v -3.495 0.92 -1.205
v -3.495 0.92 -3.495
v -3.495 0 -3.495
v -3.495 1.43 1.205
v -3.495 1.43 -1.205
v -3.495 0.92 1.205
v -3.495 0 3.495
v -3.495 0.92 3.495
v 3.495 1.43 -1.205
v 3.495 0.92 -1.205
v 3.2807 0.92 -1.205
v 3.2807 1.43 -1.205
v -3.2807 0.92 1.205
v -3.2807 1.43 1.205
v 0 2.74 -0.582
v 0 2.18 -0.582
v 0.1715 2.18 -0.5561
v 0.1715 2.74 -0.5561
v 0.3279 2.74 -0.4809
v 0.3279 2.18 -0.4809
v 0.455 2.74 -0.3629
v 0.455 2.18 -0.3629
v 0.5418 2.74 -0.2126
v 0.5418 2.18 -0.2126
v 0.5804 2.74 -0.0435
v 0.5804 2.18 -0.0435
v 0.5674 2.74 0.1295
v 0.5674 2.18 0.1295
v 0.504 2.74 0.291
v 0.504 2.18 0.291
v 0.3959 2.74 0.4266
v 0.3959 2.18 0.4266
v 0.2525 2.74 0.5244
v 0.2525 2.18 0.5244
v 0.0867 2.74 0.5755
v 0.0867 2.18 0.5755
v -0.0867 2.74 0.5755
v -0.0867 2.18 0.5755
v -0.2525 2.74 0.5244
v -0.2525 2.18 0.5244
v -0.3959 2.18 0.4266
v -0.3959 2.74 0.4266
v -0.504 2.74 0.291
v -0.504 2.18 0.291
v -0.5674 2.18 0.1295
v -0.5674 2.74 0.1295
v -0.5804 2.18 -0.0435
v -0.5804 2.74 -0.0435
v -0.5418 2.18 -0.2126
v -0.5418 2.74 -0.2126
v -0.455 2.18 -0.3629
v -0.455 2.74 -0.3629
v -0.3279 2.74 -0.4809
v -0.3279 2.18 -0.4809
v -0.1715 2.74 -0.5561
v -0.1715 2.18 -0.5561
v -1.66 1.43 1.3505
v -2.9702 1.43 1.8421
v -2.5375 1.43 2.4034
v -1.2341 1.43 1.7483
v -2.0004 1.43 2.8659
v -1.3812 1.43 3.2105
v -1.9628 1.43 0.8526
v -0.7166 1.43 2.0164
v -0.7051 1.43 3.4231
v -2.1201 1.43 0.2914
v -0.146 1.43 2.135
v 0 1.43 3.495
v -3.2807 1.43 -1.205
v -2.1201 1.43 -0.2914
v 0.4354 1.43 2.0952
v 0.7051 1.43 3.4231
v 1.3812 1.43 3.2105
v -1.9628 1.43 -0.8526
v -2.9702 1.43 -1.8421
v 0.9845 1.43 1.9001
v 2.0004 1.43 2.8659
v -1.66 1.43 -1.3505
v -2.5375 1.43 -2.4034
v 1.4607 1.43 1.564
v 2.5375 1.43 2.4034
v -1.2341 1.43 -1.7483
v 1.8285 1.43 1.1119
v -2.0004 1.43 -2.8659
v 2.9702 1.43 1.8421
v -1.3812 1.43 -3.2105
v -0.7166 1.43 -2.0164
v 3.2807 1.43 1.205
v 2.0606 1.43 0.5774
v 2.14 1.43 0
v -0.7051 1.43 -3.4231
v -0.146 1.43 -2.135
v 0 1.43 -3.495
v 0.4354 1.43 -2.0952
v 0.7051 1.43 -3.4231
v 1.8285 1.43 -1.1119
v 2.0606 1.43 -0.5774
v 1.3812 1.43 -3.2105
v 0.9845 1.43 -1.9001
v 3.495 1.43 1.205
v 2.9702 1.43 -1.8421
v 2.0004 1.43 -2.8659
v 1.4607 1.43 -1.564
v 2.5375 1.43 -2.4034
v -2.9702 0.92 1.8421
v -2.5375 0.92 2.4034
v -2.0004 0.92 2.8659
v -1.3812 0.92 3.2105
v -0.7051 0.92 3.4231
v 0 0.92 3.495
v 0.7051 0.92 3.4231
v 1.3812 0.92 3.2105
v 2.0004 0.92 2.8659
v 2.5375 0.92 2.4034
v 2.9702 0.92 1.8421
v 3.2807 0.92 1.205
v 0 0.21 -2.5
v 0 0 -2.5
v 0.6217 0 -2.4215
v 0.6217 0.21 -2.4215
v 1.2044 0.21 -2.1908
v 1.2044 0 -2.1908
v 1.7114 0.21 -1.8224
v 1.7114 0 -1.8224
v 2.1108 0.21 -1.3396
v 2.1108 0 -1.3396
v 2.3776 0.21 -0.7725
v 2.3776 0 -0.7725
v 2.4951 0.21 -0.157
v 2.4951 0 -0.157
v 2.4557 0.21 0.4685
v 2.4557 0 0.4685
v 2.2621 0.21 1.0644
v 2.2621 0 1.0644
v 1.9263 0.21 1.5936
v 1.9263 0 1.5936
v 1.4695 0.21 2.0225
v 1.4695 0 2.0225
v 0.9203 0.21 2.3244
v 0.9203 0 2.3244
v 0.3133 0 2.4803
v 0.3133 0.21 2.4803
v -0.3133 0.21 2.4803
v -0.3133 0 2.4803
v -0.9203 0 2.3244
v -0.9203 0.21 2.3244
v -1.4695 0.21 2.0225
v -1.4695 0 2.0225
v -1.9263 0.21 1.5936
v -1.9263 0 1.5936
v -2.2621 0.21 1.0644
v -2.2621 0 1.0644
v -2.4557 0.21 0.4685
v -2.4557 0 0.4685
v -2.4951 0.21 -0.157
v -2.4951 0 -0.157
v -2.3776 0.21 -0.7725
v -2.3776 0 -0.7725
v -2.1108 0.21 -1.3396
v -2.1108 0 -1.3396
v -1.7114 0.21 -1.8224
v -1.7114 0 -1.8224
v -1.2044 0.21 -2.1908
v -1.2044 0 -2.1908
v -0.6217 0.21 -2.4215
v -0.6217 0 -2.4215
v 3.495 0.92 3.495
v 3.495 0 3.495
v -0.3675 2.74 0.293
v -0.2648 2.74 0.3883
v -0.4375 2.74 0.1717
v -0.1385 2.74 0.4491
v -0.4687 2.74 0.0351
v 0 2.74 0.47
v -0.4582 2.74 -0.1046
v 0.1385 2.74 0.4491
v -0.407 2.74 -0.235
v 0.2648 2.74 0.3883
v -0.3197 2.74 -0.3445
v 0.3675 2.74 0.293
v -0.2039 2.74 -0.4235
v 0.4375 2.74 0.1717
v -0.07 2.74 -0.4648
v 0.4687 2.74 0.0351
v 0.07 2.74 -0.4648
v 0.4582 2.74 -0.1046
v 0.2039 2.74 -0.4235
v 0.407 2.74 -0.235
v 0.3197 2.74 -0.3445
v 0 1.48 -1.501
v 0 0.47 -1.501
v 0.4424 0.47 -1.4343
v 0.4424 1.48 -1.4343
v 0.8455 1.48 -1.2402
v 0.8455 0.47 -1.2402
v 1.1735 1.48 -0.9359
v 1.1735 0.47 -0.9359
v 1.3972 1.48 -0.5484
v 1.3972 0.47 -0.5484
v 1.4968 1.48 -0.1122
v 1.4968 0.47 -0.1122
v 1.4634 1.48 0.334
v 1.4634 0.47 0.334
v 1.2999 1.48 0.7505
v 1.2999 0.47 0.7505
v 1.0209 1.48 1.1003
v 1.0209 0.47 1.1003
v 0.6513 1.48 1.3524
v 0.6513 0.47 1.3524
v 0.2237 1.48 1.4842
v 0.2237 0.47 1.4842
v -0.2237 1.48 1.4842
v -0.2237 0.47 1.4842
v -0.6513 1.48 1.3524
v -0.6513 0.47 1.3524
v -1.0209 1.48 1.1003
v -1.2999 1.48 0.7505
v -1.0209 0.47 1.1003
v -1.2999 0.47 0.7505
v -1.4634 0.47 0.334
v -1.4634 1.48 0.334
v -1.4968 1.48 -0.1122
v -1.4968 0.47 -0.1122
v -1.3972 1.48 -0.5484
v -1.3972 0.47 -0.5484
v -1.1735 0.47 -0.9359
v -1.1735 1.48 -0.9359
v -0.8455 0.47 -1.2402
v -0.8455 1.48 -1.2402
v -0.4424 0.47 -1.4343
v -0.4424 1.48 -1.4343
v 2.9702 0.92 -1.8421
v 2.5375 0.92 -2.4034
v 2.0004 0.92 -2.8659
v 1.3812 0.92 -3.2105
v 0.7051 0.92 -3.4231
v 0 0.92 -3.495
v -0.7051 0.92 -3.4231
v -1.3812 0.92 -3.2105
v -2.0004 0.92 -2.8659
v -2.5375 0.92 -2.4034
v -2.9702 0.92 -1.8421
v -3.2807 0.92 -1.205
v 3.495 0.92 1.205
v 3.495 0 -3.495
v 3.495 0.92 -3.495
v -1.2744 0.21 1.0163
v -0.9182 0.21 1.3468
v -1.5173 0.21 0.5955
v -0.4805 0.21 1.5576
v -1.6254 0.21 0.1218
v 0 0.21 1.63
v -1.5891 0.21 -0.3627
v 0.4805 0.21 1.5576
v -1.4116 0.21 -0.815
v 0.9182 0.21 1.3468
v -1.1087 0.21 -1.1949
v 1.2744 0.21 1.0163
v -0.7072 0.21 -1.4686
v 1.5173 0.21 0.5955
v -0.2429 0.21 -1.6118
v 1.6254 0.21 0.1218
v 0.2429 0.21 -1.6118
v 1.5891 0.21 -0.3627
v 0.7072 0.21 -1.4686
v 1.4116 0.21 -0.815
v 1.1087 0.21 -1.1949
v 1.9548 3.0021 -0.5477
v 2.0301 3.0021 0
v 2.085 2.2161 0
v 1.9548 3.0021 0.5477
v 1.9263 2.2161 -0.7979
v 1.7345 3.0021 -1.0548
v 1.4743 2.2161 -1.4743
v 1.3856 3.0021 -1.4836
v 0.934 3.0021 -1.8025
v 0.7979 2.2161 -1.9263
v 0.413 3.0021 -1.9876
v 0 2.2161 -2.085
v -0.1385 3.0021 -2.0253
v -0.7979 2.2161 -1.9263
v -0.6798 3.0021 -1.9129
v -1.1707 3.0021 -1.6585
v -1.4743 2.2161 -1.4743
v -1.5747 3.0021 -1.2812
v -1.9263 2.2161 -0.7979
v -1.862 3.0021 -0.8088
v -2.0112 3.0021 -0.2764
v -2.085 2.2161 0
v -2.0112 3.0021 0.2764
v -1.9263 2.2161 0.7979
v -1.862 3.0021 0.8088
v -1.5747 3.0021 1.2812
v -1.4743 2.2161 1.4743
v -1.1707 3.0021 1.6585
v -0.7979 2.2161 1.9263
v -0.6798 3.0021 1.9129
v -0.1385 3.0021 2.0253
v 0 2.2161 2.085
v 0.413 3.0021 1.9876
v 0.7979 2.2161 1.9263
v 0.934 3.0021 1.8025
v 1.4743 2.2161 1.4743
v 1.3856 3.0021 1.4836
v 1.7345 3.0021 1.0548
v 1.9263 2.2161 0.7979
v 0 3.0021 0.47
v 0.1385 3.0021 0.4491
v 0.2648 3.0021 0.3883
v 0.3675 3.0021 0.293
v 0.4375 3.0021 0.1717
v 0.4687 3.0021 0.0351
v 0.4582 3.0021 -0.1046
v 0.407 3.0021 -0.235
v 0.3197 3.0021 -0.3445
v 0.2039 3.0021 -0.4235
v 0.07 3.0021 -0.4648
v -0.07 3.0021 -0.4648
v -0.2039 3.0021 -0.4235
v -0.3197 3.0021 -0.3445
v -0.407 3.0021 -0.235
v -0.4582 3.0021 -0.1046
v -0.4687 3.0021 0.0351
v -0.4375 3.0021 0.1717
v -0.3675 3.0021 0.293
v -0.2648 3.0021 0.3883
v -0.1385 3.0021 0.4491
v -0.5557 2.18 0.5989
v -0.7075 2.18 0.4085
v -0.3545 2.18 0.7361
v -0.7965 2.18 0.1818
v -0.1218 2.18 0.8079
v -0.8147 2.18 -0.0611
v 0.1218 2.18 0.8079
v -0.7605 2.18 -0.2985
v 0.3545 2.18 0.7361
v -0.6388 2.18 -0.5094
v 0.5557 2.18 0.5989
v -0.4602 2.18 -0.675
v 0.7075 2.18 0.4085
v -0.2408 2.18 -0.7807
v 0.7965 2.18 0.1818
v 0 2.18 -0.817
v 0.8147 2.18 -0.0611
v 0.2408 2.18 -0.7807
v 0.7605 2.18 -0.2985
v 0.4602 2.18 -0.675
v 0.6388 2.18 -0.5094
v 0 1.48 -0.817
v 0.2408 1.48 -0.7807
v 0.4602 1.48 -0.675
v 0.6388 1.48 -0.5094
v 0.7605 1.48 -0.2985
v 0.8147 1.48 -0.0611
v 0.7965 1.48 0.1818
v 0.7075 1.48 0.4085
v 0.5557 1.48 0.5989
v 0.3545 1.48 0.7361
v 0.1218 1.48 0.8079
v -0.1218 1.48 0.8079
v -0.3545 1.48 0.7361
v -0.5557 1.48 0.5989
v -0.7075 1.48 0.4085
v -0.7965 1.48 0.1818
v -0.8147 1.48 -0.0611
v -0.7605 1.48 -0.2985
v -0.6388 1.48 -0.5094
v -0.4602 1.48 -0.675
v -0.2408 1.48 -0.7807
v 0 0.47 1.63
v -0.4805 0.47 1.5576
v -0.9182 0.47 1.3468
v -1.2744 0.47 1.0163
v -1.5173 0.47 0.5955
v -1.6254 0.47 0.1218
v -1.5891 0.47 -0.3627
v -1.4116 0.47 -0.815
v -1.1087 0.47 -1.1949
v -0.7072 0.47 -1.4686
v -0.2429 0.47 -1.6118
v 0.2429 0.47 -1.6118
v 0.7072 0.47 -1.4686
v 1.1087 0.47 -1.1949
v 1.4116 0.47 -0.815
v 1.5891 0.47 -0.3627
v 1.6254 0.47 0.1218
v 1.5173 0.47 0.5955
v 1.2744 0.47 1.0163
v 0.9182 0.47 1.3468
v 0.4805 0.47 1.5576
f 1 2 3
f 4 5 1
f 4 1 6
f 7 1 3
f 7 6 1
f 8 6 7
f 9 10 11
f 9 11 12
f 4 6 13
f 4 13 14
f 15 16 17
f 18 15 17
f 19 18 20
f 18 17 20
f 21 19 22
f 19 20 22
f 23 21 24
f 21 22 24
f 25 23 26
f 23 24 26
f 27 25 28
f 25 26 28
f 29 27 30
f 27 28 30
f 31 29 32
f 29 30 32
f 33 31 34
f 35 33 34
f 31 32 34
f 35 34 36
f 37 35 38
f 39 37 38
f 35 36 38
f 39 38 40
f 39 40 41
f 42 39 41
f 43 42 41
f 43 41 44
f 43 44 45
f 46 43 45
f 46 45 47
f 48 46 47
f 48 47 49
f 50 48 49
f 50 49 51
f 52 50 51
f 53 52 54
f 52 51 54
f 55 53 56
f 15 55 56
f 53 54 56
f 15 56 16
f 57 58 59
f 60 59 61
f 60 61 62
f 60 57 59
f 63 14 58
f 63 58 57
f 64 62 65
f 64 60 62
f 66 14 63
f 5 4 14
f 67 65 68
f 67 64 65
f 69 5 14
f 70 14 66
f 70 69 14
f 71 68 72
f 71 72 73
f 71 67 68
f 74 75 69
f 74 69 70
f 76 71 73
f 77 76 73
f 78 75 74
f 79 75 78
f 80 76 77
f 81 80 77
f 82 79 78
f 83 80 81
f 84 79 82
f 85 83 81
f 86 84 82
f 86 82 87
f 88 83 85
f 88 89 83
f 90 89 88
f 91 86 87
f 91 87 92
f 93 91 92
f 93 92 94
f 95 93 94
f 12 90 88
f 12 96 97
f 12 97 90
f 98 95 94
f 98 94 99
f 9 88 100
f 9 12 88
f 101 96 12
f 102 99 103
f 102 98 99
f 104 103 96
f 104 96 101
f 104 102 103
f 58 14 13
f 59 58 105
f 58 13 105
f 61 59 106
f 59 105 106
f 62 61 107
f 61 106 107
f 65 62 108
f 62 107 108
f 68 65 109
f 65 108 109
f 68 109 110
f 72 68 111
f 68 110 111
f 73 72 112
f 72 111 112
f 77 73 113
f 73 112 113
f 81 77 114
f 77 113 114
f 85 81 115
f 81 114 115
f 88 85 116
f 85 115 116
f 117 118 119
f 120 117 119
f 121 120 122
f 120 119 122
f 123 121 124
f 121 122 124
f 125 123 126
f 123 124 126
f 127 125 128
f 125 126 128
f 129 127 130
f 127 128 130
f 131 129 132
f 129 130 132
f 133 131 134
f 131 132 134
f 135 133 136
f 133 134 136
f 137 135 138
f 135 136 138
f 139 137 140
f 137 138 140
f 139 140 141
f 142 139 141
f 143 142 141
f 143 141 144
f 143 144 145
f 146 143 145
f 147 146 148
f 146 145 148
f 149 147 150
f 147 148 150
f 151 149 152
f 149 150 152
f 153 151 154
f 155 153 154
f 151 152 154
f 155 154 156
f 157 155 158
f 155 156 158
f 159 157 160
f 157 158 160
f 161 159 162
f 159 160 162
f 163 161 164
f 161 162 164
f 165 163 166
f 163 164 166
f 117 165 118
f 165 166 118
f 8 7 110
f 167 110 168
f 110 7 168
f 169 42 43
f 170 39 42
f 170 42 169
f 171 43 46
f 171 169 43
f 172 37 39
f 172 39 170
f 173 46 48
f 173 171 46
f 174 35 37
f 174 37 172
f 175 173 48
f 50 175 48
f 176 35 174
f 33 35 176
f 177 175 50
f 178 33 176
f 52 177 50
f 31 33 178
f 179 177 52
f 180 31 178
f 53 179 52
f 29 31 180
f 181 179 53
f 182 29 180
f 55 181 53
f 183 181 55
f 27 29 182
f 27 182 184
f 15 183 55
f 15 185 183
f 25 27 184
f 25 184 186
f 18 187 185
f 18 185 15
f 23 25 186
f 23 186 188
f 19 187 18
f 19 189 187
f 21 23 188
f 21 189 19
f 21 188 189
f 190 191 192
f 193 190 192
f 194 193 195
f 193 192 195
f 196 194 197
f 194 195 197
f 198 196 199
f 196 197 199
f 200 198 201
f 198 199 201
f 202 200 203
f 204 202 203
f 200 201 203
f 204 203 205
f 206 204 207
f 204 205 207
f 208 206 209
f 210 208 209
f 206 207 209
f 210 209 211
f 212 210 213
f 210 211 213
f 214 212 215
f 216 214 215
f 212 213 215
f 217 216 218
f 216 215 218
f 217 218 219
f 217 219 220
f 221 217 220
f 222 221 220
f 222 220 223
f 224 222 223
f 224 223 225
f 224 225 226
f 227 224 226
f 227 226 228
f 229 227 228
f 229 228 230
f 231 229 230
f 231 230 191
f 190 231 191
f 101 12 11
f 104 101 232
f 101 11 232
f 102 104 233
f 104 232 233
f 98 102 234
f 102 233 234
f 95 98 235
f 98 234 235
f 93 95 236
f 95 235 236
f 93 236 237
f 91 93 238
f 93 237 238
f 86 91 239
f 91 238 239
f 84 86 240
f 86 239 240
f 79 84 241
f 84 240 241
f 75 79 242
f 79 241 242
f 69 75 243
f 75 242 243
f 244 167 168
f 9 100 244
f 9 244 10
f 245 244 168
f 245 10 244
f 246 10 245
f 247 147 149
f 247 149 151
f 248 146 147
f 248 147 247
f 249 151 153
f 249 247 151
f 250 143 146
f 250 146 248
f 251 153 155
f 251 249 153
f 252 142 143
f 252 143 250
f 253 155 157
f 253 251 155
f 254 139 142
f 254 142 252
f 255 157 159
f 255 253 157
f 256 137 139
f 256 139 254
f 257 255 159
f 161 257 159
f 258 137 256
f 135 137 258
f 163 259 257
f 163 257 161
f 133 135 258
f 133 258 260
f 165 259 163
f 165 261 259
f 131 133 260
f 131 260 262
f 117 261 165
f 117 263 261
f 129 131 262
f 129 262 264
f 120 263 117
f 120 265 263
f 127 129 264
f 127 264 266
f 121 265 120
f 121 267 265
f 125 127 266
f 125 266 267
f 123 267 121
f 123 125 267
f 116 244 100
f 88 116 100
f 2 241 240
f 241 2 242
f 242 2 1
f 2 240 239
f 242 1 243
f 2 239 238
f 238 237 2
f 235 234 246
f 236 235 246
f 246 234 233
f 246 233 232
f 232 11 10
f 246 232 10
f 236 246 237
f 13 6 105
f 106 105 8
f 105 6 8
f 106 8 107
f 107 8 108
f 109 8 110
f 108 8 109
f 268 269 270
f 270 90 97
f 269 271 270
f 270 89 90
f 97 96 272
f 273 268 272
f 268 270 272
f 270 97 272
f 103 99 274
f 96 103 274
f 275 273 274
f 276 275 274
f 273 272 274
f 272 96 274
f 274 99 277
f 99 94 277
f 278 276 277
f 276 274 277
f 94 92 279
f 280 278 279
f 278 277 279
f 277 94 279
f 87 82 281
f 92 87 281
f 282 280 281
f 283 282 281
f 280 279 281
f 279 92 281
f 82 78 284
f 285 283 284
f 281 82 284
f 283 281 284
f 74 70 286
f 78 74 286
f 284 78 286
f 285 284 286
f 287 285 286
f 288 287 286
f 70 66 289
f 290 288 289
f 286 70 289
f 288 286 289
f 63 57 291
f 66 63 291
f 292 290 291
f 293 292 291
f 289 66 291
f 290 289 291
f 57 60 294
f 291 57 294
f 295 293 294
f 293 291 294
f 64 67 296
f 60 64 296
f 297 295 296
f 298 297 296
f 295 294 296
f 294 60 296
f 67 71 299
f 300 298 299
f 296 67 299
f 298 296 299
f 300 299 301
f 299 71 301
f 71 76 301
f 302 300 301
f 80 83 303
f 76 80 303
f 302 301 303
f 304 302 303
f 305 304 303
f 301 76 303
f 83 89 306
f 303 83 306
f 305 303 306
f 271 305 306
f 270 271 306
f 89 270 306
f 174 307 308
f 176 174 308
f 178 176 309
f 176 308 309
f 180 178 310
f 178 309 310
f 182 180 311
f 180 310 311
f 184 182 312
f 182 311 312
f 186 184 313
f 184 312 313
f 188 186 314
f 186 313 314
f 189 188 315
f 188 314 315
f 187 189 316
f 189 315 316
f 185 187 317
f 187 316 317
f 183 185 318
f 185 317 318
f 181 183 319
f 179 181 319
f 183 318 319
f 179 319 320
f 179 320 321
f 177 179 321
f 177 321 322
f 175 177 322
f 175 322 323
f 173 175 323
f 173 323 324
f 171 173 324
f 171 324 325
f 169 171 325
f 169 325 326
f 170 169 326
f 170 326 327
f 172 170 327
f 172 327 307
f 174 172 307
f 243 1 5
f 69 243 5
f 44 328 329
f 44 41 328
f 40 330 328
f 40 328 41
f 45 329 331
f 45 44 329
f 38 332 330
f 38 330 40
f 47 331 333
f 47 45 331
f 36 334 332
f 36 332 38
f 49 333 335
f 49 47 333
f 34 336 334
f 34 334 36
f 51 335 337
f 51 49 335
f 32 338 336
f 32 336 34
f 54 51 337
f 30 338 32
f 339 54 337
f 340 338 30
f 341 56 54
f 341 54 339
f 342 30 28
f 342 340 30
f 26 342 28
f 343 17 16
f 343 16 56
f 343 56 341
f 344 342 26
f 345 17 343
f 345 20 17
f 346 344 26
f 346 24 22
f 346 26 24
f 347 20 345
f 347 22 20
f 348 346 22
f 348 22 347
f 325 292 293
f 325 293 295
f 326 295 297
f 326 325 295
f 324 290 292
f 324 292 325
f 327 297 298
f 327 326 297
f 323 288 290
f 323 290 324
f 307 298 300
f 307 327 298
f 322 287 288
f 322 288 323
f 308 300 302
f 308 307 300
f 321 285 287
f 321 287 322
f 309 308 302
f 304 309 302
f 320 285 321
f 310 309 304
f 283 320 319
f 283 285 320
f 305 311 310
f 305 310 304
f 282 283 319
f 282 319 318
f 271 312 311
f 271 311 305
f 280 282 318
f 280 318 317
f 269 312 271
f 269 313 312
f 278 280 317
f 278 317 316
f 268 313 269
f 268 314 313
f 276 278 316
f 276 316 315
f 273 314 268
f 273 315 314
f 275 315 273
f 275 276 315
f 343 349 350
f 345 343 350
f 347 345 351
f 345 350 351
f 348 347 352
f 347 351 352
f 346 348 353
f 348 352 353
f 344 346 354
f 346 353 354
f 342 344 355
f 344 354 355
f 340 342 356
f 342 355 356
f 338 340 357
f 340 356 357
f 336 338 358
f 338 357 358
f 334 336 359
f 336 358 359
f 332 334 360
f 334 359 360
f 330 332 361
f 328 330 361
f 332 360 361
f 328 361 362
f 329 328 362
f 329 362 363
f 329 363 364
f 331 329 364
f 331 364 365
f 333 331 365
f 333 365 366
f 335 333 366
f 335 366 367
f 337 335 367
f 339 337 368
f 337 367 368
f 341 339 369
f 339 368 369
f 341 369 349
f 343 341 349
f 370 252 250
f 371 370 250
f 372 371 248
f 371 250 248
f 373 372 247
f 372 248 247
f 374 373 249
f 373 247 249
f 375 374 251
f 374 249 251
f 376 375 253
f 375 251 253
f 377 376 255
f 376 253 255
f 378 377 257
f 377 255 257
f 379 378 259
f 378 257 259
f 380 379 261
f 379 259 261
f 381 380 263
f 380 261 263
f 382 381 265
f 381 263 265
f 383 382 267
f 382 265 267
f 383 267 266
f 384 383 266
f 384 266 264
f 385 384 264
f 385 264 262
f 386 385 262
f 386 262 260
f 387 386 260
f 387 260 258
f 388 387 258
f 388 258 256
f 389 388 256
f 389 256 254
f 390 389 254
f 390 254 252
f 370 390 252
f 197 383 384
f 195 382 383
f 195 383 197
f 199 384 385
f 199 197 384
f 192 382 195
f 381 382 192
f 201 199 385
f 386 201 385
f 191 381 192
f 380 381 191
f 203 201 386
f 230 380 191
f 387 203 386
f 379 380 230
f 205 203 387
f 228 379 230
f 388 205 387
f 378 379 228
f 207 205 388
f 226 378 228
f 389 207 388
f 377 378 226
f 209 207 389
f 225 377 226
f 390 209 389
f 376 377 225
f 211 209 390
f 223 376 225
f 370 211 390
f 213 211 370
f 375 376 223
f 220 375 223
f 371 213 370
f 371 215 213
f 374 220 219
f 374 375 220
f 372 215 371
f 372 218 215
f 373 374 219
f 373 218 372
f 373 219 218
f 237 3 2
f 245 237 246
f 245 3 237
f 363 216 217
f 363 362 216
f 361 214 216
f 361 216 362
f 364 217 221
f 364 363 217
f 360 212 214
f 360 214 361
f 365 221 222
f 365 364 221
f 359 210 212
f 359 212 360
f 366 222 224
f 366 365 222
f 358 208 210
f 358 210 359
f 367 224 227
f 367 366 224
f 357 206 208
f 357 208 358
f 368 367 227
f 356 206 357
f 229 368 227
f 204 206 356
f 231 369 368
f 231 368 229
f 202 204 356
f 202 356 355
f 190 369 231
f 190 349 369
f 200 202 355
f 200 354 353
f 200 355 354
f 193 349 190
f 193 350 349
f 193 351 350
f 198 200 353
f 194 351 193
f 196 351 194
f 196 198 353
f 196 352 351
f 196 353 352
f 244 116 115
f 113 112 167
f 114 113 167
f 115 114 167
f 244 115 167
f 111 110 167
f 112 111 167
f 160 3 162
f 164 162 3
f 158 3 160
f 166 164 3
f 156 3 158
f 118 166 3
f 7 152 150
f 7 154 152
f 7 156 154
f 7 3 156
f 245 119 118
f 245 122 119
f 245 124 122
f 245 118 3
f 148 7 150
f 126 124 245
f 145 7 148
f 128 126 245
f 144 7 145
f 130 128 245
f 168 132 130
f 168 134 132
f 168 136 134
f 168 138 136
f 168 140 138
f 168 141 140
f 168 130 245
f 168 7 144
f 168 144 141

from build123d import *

# Parameters (mm, degrees)
SKETCH1_W               = 7.01
SKETCH1_H               = 7.01
BOSS_EXTRUDE1_DEPTH     = 0.92
SKETCH2_R               = 3.505
BOSS_EXTRUDE2_DEPTH     = 0.83
SKETCH3_R               = 2.135
BOSS_EXTRUDE3_DEPTH     = 1.752116255
SKETCH4_R               = 2.085
CUT_EXTRUDE1_DEPTH      = 1
CUT_EXTRUDE2_DEPTH      = 7.069173606
CUT_EXTRUDE2_DEPTH_BACK = 7.069173606
SKETCH5_W               = 2.65
SKETCH5_H               = 2.65
SKETCH6_W               = 8.843273239
SKETCH6_H               = 10.721573241
SKETCH6_W_2             = 7.01
SKETCH6_H_2             = 7.01
SKETCH6_W_3             = 6
SKETCH6_H_3             = 6
CUT_EXTRUDE3_DEPTH      = 10
SKETCH7_W               = 8.855260717
SKETCH7_H               = 9.729262333
SKETCH7_R               = 3
CUT_EXTRUDE4_DEPTH      = 0.83
SKETCH8_W               = 2.771053774
SKETCH8_H               = 2.773686404
BOSS_EXTRUDE4_DEPTH     = 2.502116255
SKETCH9_R               = 0.554
CUT_EXTRUDE5_DEPTH      = 0.3
SKETCH10_R              = 0.47
CUT_EXTRUDE6_DEPTH      = 100
SKETCH11_R              = 1.501
CUT_EXTRUDE7_DEPTH      = 0.48
SKETCH12_R              = 0.817
CUT_EXTRUDE8_DEPTH      = 0.7
SKETCH14_R              = 0.582
CUT_EXTRUDE9_DEPTH      = 0.56
BOSS_EXTRUDE5_START     = 0.05
SKETCH15_R              = 0.554
SKETCH15_R_2            = 0.47
BOSS_EXTRUDE5_DEPTH     = 0.05
BOSS_EXTRUDE6_START     = 0.79
SKETCH16_R              = 2.085
SKETCH16_R_2            = 1.63
BOSS_EXTRUDE6_DEPTH     = 0.79
BOSS_EXTRUDE7_START     = 0.53
SKETCH17_R              = 1.63
SKETCH17_R_2            = 1.501
BOSS_EXTRUDE7_DEPTH     = 0.53
SKETCH18_R              = 2.572537364
SKETCH18_R_2            = 1.5
CUT_EXTRUDE10_DEPTH     = 1.752116255
BOSS_EXTRUDE8_START     = 0.21
SKETCH19_R              = 2.085
SKETCH19_R_2            = 1.705
BOSS_EXTRUDE8_DEPTH     = 0.21
SKETCH20_W              = 6.707027697
SKETCH20_H              = 11.442069063
SKETCH20_R              = 1.8
CUT_EXTRUDE11_DEPTH     = 0.83
SKETCH21_W              = 6.520255289
SKETCH21_H              = 15.458610975
SKETCH21_W_2            = 3.8
SKETCH21_H_2            = 3.8
CUT_EXTRUDE12_DEPTH     = 10
SKETCH23_W              = 6.99
SKETCH23_H              = 6.99
SKETCH23_W_2            = 3.502421246
SKETCH23_H_2            = 3.548313749
BOSS_EXTRUDE9_DEPTH     = 0.92
SKETCH24_W              = 6.057488838
SKETCH24_H              = 5.341048382
CUT_EXTRUDE14_DEPTH     = 0.13
SKETCH25_R              = 3.495
SKETCH25_R_2            = 1.679124266
BOSS_EXTRUDE10_DEPTH    = 0.83
SKETCH26_W              = 0.8
SKETCH26_H              = 2.36
BOSS_EXTRUDE11_DEPTH    = 0.83
SKETCH27_W              = 0.802423375
SKETCH27_H              = 2.36
BOSS_EXTRUDE12_DEPTH    = 0.83
SKETCH28_R              = 2.14
SKETCH28_R_2            = 1.325961915
BOSS_EXTRUDE13_DEPTH    = 1.622116255
SKETCH29_R              = 2.5
CUT_EXTRUDE15_DEPTH     = 0.21
SKETCH30_W              = 0.025
SKETCH30_H              = 0.83
BOSS_EXTRUDE14_DEPTH    = 0.4
SKETCH31_W              = 0.025
SKETCH31_H              = 0.83
BOSS_EXTRUDE15_DEPTH    = 0.4
SKETCH32_R              = 5.119404283
SKETCH32_R_2            = 2.14
CUT_EXTRUDE16_DEPTH     = 0.32
SKETCH33_W              = 6.584709795
SKETCH33_H              = 4.796866642
CUT_EXTRUDE17_DEPTH     = 0.37
SKETCH35_W              = 5.183427323
SKETCH35_H              = 5.029681598
SKETCH35_R              = 2.14
CUT_EXTRUDE18_DEPTH     = 1.572116
CUT_EXTRUDE18_DRAFT     = -4


with BuildPart() as part:
    # Sketch1 → Boss-Extrude1 (new body)
    with BuildSketch(Plane(origin=(0, 0, 0), x_dir=(1, 0, 0), z_dir=(0, 1, 0))):
        Rectangle(SKETCH1_W, SKETCH1_H)
    extrude(amount=BOSS_EXTRUDE1_DEPTH)

    # Sketch2 → Boss-Extrude2 (add)
    with BuildSketch(Plane(origin=(0, 0.92, 0), x_dir=(1, 0, 0), z_dir=(0, 1, 0))):
        with Locations(Location((0, 0, 0), (0, 0, 270))):
            Circle(SKETCH2_R)
    extrude(amount=BOSS_EXTRUDE2_DEPTH)

    # Sketch3 → Boss-Extrude3 (add)
    with BuildSketch(Plane(origin=(0, 1.75, 0), x_dir=(1, 0, 0), z_dir=(0, 1, 0))):
        with Locations(Location((0, 0, 0), (0, 0, 270))):
            Circle(SKETCH3_R)
    extrude(amount=BOSS_EXTRUDE3_DEPTH)

    # Sketch4 → Cut-Extrude1 (cut)
    with BuildSketch(Plane.XZ):
        with Locations(Location((0, 0, 0), (0, 0, 270))):
            Circle(SKETCH4_R)
    extrude(amount=-CUT_EXTRUDE1_DEPTH, mode=Mode.SUBTRACT)

    # Sketch5 → Cut-Extrude2 (cut, two sides: drawn at the far end of the back side and taken through both)
    with BuildSketch(Plane(origin=(0, 3.502116255, 0), x_dir=(1, 0, 0), z_dir=(0, 1, 0)).offset(-CUT_EXTRUDE2_DEPTH_BACK)):
        Rectangle(SKETCH5_W, SKETCH5_H)
    extrude(amount=CUT_EXTRUDE2_DEPTH + CUT_EXTRUDE2_DEPTH_BACK, mode=Mode.SUBTRACT)

    # Sketch6 → Cut-Extrude3 (cut)
    # profile 1 of 2: a face of its own
    with BuildSketch(Plane.XZ):
        with Locations((-0.050657098, -0.002715124)):
            Rectangle(SKETCH6_W, SKETCH6_H)
        Rectangle(SKETCH6_W_2, SKETCH6_H_2, mode=Mode.SUBTRACT)
    # profile 2 of 2: a face of its own
    with BuildSketch(Plane.XZ):
        Rectangle(SKETCH6_W_2, SKETCH6_H_2)
        Rectangle(SKETCH6_W_3, SKETCH6_H_3, mode=Mode.SUBTRACT)
    extrude(amount=-CUT_EXTRUDE3_DEPTH, mode=Mode.SUBTRACT)

    # Sketch7 → Cut-Extrude4 (cut)
    with BuildSketch(Plane(origin=(0, 1.75, 0), x_dir=(1, 0, 0), z_dir=(0, 1, 0))):
        with Locations((-0.111516438, -0.542198567)):
            Rectangle(SKETCH7_W, SKETCH7_H)
        with Locations(Location((0, 0, 0), (0, 0, 270))):
            Circle(SKETCH7_R, mode=Mode.SUBTRACT)
    extrude(amount=-CUT_EXTRUDE4_DEPTH, mode=Mode.SUBTRACT)

    # Sketch8 → Boss-Extrude4 (add)
    with BuildSketch(Plane.XZ.offset(-1)):
        with Locations((0.002668444, 0.023551669)):
            Rectangle(SKETCH8_W, SKETCH8_H)
    extrude(amount=-BOSS_EXTRUDE4_DEPTH)

    # Sketch9 → Cut-Extrude5 (cut)
    with BuildSketch(Plane(origin=(0, 3.502116255, 0), x_dir=(1, 0, 0), z_dir=(0, 1, 0))):
        with Locations(Location((0, 0, 0), (0, 0, 270))):
            Circle(SKETCH9_R)
    extrude(amount=-CUT_EXTRUDE5_DEPTH, mode=Mode.SUBTRACT)

    # Sketch10 → Cut-Extrude6 (cut)
    with BuildSketch(Plane(origin=(0, 3.202116255, 0), x_dir=(1, 0, 0), z_dir=(0, 1, 0))):
        with Locations(Location((0, 0, 0), (0, 0, 270))):
            Circle(SKETCH10_R)
    extrude(amount=-CUT_EXTRUDE6_DEPTH, mode=Mode.SUBTRACT)

    # Sketch11 → Cut-Extrude7 (cut)
    with BuildSketch(Plane.XZ.offset(-1)):
        with Locations(Location((0, 0, 0), (0, 0, 270))):
            Circle(SKETCH11_R)
    extrude(amount=-CUT_EXTRUDE7_DEPTH, mode=Mode.SUBTRACT)

    # Sketch12 → Cut-Extrude8 (cut)
    with BuildSketch(Plane.XZ.offset(-1.48)):
        with Locations(Location((0, 0, 0), (0, 0, 270))):
            Circle(SKETCH12_R)
    extrude(amount=-CUT_EXTRUDE8_DEPTH, mode=Mode.SUBTRACT)

    # Sketch14 → Cut-Extrude9 (cut)
    with BuildSketch(Plane.XZ.offset(-2.18)):
        with Locations(Location((0, 0, 0), (0, 0, 270))):
            Circle(SKETCH14_R)
    extrude(amount=-CUT_EXTRUDE9_DEPTH, mode=Mode.SUBTRACT)

    # Sketch15 → Boss-Extrude5 (add)
    with BuildSketch(Plane(origin=(0, 3.202116255, 0), x_dir=(1, 0, 0), z_dir=(0, 1, 0)).offset(BOSS_EXTRUDE5_START)):
        with Locations(Location((0, 0, 0), (0, 0, 270))):
            Circle(SKETCH15_R)
        with Locations(Location((0, 0, 0), (0, 0, 270))):
            Circle(SKETCH15_R_2, mode=Mode.SUBTRACT)
    extrude(amount=-BOSS_EXTRUDE5_DEPTH)

    # Sketch16 → Boss-Extrude6 (add)
    with BuildSketch(Plane.XZ.offset(-1).offset(BOSS_EXTRUDE6_START)):
        with Locations(Location((0, 0, 0), (0, 0, 270))):
            Circle(SKETCH16_R)
        with Locations(Location((0, 0, 0), (0, 0, 90))):
            Circle(SKETCH16_R_2, mode=Mode.SUBTRACT)
    extrude(amount=-BOSS_EXTRUDE6_DEPTH)

    # Sketch17 → Boss-Extrude7 (add)
    with BuildSketch(Plane.XZ.offset(-1).offset(BOSS_EXTRUDE7_START)):
        with Locations(Location((0, 0, 0), (0, 0, 90))):
            Circle(SKETCH17_R)
        with Locations(Location((0, 0, 0), (0, 0, 270))):
            Circle(SKETCH17_R_2, mode=Mode.SUBTRACT)
    extrude(amount=-BOSS_EXTRUDE7_DEPTH)

    # Sketch18 → Cut-Extrude10 (cut)
    with BuildSketch(Plane(origin=(0, 3.502116255, 0), x_dir=(1, 0, 0), z_dir=(0, 1, 0))):
        Circle(SKETCH18_R)
        with Locations(Location((0, 0, 0), (0, 0, 270))):
            Circle(SKETCH18_R_2, mode=Mode.SUBTRACT)
    extrude(amount=-CUT_EXTRUDE10_DEPTH, mode=Mode.SUBTRACT)

    # Sketch19 → Boss-Extrude8 (add)
    with BuildSketch(Plane.XZ.offset(-0.21).offset(BOSS_EXTRUDE8_START)):
        Circle(SKETCH19_R)
        with Locations(Location((0, 0, 0), (0, 0, 90))):
            Circle(SKETCH19_R_2, mode=Mode.SUBTRACT)
    extrude(amount=-BOSS_EXTRUDE8_DEPTH)

    # Sketch20 → Cut-Extrude11 (cut)
    with BuildSketch(Plane(origin=(0, 1.75, 0), x_dir=(1, 0, 0), z_dir=(0, 1, 0))):
        with Locations((0.104915626, 1.709559423)):
            Rectangle(SKETCH20_W, SKETCH20_H)
        with Locations(Location((0, 0, 0), (0, 0, 270))):
            Circle(SKETCH20_R, mode=Mode.SUBTRACT)
    extrude(amount=-CUT_EXTRUDE11_DEPTH, mode=Mode.SUBTRACT)

    # Sketch21 → Cut-Extrude12 (cut)
    with BuildSketch(Plane(origin=(0, 0.92, 0), x_dir=(1, 0, 0), z_dir=(0, 1, 0))):
        with Locations((-0.167365124, 0.45607417)):
            Rectangle(SKETCH21_W, SKETCH21_H)
        Rectangle(SKETCH21_W_2, SKETCH21_H_2, mode=Mode.SUBTRACT)
    extrude(amount=-CUT_EXTRUDE12_DEPTH, mode=Mode.SUBTRACT)

    # Sketch23 → Boss-Extrude9 (add)
    with BuildSketch(Plane.XZ):
        Rectangle(SKETCH23_W, SKETCH23_H)
        with Locations((-0.032460289, -0.038632405)):
            Rectangle(SKETCH23_W_2, SKETCH23_H_2, mode=Mode.SUBTRACT)
    extrude(amount=-BOSS_EXTRUDE9_DEPTH)

    # Sketch24 → Cut-Extrude14 (cut)
    with BuildSketch(Plane(origin=(0, 3.502116255, 0), x_dir=(1, 0, 0), z_dir=(0, 1, 0))):
        with Locations((0.48256212, -0.051480008)):
            Rectangle(SKETCH24_W, SKETCH24_H)
    extrude(amount=-CUT_EXTRUDE14_DEPTH, mode=Mode.SUBTRACT)

    # Sketch25 → Boss-Extrude10 (add)
    with BuildSketch(Plane(origin=(0, 0.92, 0), x_dir=(1, 0, 0), z_dir=(0, 1, 0))):
        with Locations(Location((0, 0, 0), (0, 0, 270))):
            Circle(SKETCH25_R)
        Circle(SKETCH25_R_2, mode=Mode.SUBTRACT)
    extrude(amount=BOSS_EXTRUDE10_DEPTH)

    # Sketch26 → Boss-Extrude11 (add)
    with BuildSketch(Plane(origin=(0, 1.75, 0), x_dir=(1, 0, 0), z_dir=(0, 1, 0))):
        with Locations((3.095, 0)):
            Rectangle(SKETCH26_W, SKETCH26_H)
    extrude(amount=-BOSS_EXTRUDE11_DEPTH)

    # Sketch27 → Boss-Extrude12 (add)
    with BuildSketch(Plane(origin=(0, 1.75, 0), x_dir=(1, 0, 0), z_dir=(0, 1, 0))):
        with Locations((-3.093788313, 0)):
            Rectangle(SKETCH27_W, SKETCH27_H)
    extrude(amount=-BOSS_EXTRUDE12_DEPTH)

    # Sketch28 → Boss-Extrude13 (add)
    with BuildSketch(Plane(origin=(0, 3.372116255, 0), x_dir=(1, 0, 0), z_dir=(0, 1, 0))):
        with Locations(Location((0, 0, 0), (0, 0, 270))):
            Circle(SKETCH28_R)
        Circle(SKETCH28_R_2, mode=Mode.SUBTRACT)
    extrude(amount=-BOSS_EXTRUDE13_DEPTH)

    # Sketch29 → Cut-Extrude15 (cut)
    with BuildSketch(Plane.XZ):
        with Locations(Location((0, 0, 0), (0, 0, 270))):
            Circle(SKETCH29_R)
    extrude(amount=-CUT_EXTRUDE15_DEPTH, mode=Mode.SUBTRACT)

    # Sketch30 → Boss-Extrude14 (add)
    with BuildSketch(Plane.ZY.offset(3.495)):
        with Locations((-1.1925, 1.335)):
            Rectangle(SKETCH30_W, SKETCH30_H)
        with Locations((1.1925, 1.335)):
            Rectangle(SKETCH30_W, SKETCH30_H)
    extrude(amount=-BOSS_EXTRUDE14_DEPTH)

    # Sketch31 → Boss-Extrude15 (add)
    with BuildSketch(Plane(origin=(3.495, 0, 0), x_dir=(0, 0, -1), z_dir=(1, 0, 0))):
        with Locations((-1.1925, 1.335)):
            Rectangle(SKETCH31_W, SKETCH31_H)
        with Locations((1.1925, 1.335)):
            Rectangle(SKETCH31_W, SKETCH31_H)
    extrude(amount=-BOSS_EXTRUDE15_DEPTH)

    # Sketch32 → Cut-Extrude16 (cut)
    with BuildSketch(Plane(origin=(0, 1.75, 0), x_dir=(1, 0, 0), z_dir=(0, 1, 0))):
        Circle(SKETCH32_R)
        with Locations(Location((0, 0, 0), (0, 0, 270))):
            Circle(SKETCH32_R_2, mode=Mode.SUBTRACT)
    extrude(amount=-CUT_EXTRUDE16_DEPTH, mode=Mode.SUBTRACT)

    # Sketch33 → Cut-Extrude17 (cut)
    with BuildSketch(Plane(origin=(0, 3.372116255, 0), x_dir=(1, 0, 0), z_dir=(0, 1, 0))):
        with Locations((0.213047648, -0.01757094)):
            Rectangle(SKETCH33_W, SKETCH33_H)
    extrude(amount=-CUT_EXTRUDE17_DEPTH, mode=Mode.SUBTRACT)


with BuildPart() as cut_extrude18_tool:
    # Sketch35 → Cut-Extrude18 (with draft: the straight prism first)
    with BuildSketch(Plane(origin=(0, 1.43, 0), x_dir=(1, 0, 0), z_dir=(0, 1, 0))):
        with Locations((0.01757094, -0.081265598)):
            Rectangle(SKETCH35_W, SKETCH35_H)
        Circle(SKETCH35_R, mode=Mode.SUBTRACT)
    extrude(amount=CUT_EXTRUDE18_DEPTH)
    # Cut-Extrude18: the draft: its side faces are tilted about the plane it starts from
    cut_extrude18_sides = [cut_extrude18_tool.faces().sort_by_distance(p)[0] for p in [
        (-2.574142721, 2.216058, 0.081265598),
        (0.01757094, 2.216058, 2.596106397),
        (2.609284602, 2.216058, 0.081265598),
        (0.01757094, 2.216058, -2.433575201),
        (-2.14, 2.216058, 0),
    ]]
    draft(cut_extrude18_sides, Plane(origin=(0, 1.43, 0), x_dir=(1, 0, 0), z_dir=(0, 1, 0)), CUT_EXTRUDE18_DRAFT)


with BuildPart() as part_1:
    add(part.part)

    # Cut-Extrude18: cut by cut_extrude18_tool
    add(cut_extrude18_tool.part, mode=Mode.SUBTRACT)


solid = part_1.part
